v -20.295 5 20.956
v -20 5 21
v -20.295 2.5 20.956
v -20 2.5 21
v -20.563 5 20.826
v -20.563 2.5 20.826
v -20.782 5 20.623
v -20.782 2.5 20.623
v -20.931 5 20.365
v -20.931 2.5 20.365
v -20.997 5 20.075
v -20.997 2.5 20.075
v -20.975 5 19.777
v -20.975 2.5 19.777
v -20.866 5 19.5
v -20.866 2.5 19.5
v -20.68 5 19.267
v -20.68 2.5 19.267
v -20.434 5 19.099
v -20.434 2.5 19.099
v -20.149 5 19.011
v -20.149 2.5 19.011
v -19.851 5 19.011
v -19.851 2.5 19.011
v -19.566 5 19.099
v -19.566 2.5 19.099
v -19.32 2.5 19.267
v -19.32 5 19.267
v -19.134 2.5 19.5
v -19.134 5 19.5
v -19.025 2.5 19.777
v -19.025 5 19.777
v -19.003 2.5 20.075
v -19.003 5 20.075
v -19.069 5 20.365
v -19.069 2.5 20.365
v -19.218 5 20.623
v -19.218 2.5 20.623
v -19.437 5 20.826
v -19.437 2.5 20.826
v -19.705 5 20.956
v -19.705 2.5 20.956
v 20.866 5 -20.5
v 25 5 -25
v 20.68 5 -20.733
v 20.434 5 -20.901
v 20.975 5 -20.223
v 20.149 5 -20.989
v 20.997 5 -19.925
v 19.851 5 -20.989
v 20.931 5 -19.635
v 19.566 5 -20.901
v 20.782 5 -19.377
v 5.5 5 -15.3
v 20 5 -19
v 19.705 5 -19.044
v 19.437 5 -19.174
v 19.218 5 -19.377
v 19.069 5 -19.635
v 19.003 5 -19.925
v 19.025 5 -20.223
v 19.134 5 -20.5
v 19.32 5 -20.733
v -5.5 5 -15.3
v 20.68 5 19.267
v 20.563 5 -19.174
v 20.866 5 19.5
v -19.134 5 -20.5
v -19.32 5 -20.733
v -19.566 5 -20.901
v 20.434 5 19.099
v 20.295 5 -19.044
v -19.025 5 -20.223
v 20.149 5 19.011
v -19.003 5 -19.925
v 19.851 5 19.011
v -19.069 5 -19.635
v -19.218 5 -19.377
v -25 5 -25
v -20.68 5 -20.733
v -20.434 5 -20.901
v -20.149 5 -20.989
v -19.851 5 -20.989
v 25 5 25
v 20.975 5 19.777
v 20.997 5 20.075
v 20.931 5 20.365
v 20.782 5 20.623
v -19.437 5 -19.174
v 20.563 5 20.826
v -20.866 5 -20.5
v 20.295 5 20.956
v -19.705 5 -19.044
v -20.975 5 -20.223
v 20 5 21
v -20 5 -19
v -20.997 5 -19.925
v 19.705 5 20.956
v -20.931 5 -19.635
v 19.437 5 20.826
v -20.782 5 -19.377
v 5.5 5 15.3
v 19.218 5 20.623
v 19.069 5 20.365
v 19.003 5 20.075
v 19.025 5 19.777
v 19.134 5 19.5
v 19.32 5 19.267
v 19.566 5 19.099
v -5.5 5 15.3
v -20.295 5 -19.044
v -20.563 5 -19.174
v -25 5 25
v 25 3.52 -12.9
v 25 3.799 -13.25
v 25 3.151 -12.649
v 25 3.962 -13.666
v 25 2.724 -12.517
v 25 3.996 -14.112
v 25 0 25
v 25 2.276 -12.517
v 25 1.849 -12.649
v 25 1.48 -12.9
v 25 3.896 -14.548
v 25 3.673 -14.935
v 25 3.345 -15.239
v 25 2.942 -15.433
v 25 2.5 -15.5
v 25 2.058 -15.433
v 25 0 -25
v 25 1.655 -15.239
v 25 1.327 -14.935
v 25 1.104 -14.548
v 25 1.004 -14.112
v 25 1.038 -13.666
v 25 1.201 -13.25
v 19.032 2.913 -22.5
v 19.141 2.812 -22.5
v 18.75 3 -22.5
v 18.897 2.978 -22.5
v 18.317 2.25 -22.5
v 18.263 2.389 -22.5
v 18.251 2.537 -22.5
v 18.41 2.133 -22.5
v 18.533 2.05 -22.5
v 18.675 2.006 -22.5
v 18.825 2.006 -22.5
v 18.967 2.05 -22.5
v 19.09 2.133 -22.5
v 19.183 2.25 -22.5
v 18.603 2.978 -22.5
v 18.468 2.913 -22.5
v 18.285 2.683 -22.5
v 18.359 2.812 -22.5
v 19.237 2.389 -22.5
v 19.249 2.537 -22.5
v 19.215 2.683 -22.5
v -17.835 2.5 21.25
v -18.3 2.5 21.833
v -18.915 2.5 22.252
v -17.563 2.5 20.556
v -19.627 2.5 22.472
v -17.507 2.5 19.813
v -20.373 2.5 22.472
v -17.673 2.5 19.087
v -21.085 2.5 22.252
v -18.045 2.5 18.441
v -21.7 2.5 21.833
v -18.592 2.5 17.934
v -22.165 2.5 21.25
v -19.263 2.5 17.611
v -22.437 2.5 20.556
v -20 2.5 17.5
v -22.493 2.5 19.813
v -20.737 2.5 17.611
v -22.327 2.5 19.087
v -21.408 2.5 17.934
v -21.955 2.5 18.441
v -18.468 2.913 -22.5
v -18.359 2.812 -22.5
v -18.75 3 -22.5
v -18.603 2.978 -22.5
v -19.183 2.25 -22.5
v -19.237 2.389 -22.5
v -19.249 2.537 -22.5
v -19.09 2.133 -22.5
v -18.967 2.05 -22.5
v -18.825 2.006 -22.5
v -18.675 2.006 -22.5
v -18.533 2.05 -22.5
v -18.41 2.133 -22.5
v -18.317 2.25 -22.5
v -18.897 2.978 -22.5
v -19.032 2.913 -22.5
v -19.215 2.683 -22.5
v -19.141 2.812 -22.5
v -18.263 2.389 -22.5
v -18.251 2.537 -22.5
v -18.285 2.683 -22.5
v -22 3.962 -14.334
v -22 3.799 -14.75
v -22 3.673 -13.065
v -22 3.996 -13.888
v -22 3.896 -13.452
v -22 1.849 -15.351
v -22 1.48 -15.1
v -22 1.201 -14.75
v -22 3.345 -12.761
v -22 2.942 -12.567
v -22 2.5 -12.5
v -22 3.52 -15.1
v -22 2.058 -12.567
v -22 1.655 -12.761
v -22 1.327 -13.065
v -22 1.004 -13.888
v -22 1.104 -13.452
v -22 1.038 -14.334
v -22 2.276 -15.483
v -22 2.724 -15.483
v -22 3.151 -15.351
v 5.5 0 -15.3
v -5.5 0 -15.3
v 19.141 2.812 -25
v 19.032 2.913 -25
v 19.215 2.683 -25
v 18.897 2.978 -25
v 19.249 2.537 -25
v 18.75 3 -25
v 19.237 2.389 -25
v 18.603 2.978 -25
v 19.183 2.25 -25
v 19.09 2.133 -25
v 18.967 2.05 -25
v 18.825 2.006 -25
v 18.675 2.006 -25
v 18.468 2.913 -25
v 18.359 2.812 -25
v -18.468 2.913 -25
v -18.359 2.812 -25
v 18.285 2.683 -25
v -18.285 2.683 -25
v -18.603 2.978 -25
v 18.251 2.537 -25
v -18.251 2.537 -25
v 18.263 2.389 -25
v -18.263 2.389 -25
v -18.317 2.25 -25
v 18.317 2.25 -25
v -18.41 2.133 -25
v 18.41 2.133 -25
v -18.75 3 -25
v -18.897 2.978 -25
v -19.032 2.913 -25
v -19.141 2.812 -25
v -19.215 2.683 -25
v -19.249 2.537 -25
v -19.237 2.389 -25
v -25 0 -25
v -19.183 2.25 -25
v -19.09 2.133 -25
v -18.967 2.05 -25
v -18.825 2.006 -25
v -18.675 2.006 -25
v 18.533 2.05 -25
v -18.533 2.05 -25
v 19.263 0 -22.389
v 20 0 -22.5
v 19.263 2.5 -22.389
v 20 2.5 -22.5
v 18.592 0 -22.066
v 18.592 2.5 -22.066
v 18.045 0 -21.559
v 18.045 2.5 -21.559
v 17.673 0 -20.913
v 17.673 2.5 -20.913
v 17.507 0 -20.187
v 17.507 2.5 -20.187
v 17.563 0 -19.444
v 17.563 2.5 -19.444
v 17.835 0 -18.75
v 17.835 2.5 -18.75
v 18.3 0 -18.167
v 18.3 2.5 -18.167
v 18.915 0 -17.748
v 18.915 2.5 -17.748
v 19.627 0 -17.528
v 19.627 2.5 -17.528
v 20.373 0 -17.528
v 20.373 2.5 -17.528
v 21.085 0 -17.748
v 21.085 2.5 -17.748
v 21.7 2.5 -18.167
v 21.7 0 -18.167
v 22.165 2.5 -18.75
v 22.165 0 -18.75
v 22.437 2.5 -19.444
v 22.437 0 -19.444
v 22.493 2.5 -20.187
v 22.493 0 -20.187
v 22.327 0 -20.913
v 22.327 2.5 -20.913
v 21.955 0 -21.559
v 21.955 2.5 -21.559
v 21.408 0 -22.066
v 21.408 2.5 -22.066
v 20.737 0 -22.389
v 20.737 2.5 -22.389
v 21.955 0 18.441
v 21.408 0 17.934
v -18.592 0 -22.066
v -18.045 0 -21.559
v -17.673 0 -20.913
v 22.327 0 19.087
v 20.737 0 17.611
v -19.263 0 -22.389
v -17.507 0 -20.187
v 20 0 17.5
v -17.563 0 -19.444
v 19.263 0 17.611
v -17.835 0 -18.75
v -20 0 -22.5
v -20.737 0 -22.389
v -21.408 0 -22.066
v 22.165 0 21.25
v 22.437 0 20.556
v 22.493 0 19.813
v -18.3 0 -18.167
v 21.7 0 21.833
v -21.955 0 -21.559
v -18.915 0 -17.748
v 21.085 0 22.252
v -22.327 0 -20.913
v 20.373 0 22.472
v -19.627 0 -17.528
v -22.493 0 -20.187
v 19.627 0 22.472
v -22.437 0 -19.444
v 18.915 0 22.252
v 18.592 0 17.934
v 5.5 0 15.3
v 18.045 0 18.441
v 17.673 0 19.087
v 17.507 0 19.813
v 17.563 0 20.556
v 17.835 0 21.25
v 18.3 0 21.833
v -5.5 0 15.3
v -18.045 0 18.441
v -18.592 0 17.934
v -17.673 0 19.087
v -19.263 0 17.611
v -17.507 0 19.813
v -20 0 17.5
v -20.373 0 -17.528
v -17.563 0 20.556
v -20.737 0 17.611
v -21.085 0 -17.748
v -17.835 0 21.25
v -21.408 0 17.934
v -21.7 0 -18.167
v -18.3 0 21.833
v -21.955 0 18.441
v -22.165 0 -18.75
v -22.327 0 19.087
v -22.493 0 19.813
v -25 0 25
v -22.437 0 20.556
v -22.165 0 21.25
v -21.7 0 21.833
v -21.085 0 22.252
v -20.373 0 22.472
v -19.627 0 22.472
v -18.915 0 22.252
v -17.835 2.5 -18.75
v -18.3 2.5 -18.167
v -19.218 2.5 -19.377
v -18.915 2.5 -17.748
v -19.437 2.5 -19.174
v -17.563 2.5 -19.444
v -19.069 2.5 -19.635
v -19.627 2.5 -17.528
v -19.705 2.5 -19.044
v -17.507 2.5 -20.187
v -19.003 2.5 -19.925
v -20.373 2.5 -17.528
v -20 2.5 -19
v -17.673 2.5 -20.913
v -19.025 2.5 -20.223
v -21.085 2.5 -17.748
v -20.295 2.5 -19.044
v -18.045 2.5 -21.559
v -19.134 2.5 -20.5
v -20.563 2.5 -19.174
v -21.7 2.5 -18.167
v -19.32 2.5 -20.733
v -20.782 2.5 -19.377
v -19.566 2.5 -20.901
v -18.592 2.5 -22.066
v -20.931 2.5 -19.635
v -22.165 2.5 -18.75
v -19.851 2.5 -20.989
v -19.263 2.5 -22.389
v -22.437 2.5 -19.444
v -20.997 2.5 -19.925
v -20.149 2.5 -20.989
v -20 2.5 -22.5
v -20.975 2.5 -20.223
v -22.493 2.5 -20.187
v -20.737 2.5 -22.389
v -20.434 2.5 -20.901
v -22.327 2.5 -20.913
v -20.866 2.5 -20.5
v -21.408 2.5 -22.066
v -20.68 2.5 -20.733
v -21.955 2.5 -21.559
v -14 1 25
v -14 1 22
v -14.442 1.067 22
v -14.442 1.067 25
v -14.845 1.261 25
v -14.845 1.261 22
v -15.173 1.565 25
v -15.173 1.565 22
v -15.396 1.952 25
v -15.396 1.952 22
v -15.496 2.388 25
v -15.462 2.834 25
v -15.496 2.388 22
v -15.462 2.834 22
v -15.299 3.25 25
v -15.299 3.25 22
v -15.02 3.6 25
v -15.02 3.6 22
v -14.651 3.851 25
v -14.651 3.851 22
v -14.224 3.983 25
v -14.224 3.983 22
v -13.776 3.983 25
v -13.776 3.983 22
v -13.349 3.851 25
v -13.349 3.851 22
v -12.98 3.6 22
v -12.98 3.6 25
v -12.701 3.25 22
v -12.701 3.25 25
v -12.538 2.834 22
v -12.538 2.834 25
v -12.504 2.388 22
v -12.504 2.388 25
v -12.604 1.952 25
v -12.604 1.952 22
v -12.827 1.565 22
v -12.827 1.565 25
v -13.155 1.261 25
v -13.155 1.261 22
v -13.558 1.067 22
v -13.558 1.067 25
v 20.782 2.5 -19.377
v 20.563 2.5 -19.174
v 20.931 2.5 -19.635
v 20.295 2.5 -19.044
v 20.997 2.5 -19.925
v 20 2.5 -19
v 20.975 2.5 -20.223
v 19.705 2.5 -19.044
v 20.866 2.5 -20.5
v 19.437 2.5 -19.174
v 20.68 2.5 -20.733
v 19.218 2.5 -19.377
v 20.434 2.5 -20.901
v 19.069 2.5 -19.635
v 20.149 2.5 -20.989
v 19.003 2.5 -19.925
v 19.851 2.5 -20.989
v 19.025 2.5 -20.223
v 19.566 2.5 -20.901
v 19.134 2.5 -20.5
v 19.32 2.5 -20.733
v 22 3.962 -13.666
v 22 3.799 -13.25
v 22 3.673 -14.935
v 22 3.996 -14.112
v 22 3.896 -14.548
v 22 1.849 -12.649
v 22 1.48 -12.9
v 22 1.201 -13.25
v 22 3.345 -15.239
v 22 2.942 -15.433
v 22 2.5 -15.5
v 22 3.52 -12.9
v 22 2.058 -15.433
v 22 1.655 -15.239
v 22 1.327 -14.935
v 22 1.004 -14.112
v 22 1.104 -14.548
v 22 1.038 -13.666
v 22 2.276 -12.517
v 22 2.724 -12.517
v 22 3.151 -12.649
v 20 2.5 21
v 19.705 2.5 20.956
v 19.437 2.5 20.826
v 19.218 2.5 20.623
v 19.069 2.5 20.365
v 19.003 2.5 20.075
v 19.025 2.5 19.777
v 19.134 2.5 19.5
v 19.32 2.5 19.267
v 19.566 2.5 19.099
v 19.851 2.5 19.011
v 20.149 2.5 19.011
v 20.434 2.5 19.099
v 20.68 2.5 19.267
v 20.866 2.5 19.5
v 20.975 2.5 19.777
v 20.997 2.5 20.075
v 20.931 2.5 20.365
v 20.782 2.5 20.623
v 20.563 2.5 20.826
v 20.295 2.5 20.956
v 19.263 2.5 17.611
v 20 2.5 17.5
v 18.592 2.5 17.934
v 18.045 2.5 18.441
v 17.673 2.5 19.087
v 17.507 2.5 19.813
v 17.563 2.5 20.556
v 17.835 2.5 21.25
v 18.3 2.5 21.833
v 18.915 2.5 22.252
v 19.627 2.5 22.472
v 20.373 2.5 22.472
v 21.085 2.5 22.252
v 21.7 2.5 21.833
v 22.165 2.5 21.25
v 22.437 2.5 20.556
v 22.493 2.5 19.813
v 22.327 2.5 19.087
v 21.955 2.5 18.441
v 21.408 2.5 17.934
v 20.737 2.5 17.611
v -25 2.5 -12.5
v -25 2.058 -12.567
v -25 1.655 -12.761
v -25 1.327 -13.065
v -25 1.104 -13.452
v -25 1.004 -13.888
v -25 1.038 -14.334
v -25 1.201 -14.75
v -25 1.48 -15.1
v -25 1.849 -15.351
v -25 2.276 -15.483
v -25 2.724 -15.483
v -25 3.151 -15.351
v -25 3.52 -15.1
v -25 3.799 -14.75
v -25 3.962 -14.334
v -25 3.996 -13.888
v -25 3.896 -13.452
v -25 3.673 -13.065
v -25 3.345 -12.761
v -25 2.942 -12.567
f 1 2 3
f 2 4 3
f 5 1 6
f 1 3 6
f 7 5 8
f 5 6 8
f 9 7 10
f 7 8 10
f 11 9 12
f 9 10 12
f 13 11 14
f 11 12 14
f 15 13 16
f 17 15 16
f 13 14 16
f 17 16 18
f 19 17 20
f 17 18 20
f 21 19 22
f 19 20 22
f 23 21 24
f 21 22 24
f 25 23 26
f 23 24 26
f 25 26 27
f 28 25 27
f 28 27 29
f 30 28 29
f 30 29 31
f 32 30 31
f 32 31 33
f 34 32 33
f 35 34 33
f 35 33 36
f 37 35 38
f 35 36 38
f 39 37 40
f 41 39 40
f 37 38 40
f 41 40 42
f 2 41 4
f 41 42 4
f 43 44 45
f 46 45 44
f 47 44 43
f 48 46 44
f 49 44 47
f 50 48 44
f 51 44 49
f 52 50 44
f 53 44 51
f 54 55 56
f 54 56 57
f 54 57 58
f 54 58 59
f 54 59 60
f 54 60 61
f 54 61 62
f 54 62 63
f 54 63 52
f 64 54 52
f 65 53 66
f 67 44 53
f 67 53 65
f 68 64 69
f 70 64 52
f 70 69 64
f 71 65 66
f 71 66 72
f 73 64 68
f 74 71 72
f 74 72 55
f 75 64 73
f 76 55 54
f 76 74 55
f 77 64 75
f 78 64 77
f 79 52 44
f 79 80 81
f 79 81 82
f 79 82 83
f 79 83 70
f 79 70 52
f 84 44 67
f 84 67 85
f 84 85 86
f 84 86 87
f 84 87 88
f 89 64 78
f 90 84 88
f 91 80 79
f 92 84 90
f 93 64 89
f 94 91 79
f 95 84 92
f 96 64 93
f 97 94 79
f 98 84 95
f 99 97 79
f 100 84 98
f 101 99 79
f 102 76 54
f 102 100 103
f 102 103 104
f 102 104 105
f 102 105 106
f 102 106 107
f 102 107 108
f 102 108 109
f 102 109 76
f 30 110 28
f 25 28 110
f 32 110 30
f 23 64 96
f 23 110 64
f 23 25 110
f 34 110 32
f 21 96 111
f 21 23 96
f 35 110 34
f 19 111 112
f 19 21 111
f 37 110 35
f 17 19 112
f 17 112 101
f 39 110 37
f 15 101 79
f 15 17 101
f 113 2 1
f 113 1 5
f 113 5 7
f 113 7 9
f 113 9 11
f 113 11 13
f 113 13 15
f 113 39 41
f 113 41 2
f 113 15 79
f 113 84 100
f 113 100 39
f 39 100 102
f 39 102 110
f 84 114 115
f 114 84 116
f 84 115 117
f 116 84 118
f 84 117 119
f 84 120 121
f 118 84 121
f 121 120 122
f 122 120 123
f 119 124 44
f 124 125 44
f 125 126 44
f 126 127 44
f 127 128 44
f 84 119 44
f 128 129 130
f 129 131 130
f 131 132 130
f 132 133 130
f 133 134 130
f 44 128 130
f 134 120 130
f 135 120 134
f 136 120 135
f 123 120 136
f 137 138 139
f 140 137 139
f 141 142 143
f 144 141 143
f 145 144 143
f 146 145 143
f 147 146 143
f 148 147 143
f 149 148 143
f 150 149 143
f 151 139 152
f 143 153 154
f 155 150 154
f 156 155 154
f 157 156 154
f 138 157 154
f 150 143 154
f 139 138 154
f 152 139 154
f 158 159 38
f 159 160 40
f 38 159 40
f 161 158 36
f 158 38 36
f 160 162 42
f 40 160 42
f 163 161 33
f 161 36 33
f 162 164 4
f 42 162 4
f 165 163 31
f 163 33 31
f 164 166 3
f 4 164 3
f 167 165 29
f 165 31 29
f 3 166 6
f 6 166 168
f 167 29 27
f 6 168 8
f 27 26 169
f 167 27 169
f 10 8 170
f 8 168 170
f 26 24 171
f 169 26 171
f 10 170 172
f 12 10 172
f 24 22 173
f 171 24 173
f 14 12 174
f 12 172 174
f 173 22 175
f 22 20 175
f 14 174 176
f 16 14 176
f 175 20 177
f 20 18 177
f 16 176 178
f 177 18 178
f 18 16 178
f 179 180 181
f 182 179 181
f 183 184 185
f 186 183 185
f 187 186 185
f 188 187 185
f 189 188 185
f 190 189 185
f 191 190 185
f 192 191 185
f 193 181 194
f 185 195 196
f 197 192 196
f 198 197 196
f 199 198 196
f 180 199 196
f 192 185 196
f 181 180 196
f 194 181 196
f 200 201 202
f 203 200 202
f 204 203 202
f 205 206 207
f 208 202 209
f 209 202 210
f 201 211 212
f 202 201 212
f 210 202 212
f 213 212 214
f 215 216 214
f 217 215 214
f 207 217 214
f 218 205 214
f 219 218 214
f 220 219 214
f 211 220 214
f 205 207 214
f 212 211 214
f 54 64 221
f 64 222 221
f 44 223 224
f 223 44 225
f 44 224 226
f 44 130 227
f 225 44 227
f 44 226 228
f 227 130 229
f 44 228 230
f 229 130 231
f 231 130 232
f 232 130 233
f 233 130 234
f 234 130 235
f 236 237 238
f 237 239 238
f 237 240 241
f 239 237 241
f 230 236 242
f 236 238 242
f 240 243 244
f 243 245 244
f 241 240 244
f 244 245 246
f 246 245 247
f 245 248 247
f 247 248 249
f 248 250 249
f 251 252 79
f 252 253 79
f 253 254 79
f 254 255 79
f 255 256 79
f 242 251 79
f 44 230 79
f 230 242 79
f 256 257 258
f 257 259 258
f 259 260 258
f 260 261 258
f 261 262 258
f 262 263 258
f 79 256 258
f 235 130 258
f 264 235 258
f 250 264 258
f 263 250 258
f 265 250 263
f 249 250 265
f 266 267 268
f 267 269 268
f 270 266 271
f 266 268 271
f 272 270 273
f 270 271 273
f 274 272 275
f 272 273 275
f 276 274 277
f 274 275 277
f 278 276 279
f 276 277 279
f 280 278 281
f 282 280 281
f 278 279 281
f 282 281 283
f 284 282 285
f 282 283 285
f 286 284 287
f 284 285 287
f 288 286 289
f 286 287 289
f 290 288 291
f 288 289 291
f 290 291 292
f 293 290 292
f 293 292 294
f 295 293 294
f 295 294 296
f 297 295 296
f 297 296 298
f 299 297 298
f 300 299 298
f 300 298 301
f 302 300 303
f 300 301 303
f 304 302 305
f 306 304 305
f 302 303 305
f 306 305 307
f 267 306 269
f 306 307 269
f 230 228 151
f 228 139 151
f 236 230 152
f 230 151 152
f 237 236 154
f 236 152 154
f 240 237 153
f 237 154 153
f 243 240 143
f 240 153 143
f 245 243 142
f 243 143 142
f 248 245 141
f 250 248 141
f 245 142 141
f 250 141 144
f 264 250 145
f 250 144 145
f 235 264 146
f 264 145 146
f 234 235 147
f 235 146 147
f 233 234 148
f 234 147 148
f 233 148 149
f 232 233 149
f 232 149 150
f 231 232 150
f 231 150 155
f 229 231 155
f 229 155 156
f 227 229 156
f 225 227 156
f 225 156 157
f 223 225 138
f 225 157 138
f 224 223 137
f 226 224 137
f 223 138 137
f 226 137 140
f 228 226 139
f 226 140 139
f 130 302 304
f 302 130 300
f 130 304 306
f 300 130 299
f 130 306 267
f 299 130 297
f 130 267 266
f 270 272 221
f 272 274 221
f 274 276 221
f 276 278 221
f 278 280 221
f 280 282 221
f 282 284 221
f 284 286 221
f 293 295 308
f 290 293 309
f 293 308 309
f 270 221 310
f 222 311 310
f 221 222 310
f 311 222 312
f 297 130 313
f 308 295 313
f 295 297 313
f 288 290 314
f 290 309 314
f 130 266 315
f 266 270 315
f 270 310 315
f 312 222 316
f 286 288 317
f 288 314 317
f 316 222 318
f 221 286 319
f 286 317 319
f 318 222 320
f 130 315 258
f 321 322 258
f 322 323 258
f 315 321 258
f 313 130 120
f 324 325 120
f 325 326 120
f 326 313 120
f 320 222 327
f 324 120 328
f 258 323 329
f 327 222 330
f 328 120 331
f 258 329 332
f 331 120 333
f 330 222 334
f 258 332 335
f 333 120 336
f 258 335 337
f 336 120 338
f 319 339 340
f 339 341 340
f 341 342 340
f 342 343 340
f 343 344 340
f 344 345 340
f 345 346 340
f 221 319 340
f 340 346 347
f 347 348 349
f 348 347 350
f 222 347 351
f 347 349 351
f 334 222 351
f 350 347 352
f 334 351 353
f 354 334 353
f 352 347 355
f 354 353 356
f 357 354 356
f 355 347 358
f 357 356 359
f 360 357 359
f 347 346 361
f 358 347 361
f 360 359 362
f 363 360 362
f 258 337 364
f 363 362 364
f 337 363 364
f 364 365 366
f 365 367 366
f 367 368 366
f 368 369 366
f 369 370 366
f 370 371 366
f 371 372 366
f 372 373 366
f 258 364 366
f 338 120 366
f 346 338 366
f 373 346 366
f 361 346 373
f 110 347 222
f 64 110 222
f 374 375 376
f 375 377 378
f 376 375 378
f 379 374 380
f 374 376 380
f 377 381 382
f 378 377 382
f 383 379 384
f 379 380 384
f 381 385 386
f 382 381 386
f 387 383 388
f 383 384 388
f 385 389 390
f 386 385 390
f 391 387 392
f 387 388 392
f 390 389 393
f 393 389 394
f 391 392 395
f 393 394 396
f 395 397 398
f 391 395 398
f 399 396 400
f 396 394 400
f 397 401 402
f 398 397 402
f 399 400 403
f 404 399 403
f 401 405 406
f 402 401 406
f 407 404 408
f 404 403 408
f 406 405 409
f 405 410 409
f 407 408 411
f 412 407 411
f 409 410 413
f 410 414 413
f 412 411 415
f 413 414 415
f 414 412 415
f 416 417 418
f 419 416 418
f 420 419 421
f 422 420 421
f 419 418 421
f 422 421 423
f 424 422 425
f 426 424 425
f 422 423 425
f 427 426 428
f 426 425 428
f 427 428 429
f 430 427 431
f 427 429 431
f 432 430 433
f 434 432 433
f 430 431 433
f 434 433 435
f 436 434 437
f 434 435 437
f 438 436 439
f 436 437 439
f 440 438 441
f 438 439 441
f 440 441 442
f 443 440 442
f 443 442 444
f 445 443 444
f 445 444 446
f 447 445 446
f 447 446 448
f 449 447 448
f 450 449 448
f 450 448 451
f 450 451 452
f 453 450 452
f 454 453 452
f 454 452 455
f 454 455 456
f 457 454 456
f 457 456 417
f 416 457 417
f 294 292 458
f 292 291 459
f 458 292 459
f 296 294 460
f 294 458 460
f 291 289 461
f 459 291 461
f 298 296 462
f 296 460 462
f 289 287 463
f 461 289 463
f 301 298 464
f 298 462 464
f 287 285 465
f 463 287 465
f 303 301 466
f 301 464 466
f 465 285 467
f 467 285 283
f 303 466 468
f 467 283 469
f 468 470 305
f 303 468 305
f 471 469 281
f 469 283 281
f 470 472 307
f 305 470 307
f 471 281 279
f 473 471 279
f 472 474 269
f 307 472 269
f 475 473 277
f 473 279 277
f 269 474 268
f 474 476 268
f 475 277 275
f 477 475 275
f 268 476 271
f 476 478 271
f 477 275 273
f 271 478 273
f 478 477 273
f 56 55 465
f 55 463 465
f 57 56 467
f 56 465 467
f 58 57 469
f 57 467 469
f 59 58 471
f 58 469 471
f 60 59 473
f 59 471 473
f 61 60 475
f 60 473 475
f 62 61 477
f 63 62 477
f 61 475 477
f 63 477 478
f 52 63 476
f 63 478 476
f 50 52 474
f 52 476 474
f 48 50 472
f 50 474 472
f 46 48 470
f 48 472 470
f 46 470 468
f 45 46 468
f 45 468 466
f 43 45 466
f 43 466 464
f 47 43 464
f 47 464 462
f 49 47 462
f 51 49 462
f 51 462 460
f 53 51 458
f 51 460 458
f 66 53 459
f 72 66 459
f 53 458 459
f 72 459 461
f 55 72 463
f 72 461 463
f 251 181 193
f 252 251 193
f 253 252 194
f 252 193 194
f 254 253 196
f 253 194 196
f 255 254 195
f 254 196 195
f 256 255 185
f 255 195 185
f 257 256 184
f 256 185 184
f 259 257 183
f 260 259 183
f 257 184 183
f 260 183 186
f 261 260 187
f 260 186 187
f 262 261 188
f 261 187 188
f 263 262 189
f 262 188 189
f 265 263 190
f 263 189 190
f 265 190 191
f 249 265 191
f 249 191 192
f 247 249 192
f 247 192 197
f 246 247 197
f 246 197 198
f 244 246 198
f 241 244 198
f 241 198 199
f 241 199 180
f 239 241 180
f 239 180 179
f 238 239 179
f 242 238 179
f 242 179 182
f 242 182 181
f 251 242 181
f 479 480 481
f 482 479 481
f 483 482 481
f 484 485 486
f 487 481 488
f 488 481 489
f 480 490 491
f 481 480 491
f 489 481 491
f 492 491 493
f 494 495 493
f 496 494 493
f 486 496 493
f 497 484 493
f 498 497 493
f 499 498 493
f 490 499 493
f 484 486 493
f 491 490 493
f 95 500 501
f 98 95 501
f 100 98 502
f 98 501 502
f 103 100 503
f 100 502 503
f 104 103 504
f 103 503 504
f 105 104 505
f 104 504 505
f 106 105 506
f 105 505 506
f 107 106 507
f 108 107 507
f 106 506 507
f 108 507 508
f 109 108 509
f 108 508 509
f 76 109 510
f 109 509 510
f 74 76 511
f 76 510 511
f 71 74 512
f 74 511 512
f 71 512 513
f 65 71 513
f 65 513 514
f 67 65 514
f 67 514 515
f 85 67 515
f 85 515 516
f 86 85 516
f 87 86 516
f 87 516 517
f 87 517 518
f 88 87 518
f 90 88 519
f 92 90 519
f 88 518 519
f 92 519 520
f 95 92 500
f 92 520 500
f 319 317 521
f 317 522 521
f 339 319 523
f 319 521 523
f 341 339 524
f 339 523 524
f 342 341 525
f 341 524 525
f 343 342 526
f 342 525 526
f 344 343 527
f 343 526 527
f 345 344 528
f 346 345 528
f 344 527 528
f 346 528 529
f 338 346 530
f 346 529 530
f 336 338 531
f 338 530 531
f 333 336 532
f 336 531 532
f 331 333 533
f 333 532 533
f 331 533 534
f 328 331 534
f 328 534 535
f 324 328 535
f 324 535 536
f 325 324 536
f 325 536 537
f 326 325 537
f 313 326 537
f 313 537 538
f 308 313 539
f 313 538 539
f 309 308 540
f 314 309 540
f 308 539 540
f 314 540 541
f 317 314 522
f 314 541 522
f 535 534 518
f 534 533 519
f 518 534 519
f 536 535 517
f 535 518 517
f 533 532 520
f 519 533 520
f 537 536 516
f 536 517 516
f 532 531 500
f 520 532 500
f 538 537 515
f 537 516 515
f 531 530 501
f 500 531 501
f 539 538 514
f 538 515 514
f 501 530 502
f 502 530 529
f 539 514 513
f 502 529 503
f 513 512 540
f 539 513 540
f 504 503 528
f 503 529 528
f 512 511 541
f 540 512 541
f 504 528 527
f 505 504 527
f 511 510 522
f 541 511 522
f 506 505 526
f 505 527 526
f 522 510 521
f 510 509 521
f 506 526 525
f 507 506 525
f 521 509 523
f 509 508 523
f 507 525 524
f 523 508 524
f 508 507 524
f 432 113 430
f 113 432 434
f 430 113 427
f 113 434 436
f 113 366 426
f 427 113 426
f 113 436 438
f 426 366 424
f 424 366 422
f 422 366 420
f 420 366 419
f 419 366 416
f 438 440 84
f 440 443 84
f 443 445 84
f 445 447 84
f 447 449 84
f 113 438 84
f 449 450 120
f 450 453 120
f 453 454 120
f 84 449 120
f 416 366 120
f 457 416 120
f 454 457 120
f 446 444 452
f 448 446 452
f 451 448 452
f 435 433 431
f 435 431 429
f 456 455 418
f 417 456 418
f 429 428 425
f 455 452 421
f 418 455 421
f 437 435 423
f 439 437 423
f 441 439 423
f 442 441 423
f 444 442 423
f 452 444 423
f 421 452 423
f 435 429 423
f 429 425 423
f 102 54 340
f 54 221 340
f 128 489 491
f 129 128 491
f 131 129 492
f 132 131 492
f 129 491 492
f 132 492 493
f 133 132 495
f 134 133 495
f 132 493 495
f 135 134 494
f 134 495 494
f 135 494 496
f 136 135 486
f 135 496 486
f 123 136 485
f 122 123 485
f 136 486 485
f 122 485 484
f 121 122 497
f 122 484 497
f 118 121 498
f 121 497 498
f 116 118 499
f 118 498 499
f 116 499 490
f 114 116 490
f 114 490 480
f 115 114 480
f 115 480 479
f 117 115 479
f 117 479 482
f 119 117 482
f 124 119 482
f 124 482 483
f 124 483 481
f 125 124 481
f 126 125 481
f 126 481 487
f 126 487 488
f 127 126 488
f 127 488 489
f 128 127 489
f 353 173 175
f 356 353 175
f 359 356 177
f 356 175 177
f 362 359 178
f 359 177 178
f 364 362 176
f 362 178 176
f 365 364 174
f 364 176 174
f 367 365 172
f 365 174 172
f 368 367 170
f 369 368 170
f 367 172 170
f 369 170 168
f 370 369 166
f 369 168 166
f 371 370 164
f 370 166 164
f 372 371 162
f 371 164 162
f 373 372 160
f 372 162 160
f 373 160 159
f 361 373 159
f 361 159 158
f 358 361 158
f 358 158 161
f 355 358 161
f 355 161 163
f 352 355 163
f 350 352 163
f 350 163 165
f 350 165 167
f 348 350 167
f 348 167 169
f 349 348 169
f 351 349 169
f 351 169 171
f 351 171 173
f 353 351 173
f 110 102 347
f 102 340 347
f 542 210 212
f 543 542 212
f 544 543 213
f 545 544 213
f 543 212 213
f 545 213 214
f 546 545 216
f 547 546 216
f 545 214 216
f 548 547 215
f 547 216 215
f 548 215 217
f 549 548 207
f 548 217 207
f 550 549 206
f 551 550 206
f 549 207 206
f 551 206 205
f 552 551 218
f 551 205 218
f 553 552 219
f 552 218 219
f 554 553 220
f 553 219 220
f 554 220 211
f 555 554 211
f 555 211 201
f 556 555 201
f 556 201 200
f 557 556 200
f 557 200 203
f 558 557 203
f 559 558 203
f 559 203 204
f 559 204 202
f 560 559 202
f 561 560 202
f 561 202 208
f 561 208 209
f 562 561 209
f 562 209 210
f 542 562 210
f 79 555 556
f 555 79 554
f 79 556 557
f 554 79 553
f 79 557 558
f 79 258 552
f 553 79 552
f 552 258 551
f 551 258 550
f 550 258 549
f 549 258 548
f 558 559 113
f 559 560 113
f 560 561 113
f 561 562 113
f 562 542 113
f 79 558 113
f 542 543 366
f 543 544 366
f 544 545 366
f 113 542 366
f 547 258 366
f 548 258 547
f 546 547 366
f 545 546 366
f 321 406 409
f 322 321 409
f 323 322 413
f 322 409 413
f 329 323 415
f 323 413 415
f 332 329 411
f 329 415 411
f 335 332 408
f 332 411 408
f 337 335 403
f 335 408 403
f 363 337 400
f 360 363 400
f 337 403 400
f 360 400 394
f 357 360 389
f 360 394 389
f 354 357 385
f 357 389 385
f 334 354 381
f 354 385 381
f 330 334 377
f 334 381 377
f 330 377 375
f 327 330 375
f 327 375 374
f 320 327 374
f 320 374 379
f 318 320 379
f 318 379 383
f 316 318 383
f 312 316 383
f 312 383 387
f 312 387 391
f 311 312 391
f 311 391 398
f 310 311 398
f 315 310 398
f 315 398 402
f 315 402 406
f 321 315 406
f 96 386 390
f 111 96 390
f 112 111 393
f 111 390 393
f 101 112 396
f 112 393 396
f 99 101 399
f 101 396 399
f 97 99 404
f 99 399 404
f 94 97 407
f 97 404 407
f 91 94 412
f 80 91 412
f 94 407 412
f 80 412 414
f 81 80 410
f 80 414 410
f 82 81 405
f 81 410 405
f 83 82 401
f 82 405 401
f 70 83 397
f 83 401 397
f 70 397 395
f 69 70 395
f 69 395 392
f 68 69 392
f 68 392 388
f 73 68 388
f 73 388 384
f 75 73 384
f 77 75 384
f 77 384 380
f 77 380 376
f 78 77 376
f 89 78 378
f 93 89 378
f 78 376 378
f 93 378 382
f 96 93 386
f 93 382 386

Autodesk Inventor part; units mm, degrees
ref_plane "YZ Plane" through (0, 0, 0) normal (1, 0, 0) x (0, 1, 0)
ref_plane "XZ Plane" through (0, 0, 0) normal (0, 1, 0) x (-1, 0, 0)
ref_plane "XY Plane" through (0, 0, 0) normal (0, 0, 1) x (1, 0, 0)
sketch "Szkic1" plane through (0, 0, 0) normal (0, 1, 0) x (-1, 0, 0)
  line L0 (25, 25) -> (-25, 25)
  line L1 (-25, 25) -> (-25, -25)
  line L2 (-25, -25) -> (25, -25)
  line L3 (25, -25) -> (25, 25)
  line L4 (0, 25) -> (0, -25)
  line L5 (25, 0) -> (-25, 0)
  circle A0 centre (20, -20) radius 2.5
  circle A1 centre (20, 20) radius 2.5
  circle A2 centre (-20, -20) radius 2.5
  circle A3 centre (-20, 20) radius 2.5
  line L6 (-5.5, 15.3) -> (5.5, 15.3)
  line L7 (5.5, 15.3) -> (5.5, -15.3)
  line L8 (5.5, -15.3) -> (-5.5, -15.3)
  line L9 (-5.5, -15.3) -> (-5.5, 15.3)
  point P0 (0, 0)
  point P1 (0, 0)
  dimension "d0" = 50
  dimension "d1" = 50
  dimension "d2" = 25
  dimension "d3" = 25
  dimension "d4" = 5
  dimension "d5" = 20
  dimension "d6" = 20
  dimension "d69" = 11
  dimension "d70" = 30.6
sketch "Szkic2" plane through (0, 0, 0) normal (0, 1, 0) x (-1, 0, 0)
  point P0 (0, 0)
extrude "Wyciągnięcie proste1" add sketch "Szkic1" along normal blind 5 contours L3 L5 L7 L6 L4 L0 | L4 L6 L9 L5 L1 L0 | L3 L2 L4 L8 L7 L5 | L5 L9 L8 L4 L2 L1 | A0 | A1 | A2 | A3
sketch "Szkic3" plane through (0, 0, 0) normal (0, -1, 0) x (1, 0, 0)
  circle A0 centre (-20, -20) radius 2.5
  line L0 (0, 29.2243) -> (0, -29.2243)
  line L1 (55.447, 0) -> (-42.023, 0)
  circle A1 centre (20, -20) radius 2.5
  circle A2 centre (-20, 20) radius 2.5
  circle A3 centre (20, 20) radius 2.5
  point P0 (0, 0)
  point P1 (0, 0)
  dimension "d9" = 5
  dimension "d10" = 20
  dimension "d11" = 20
hole "Otwór1" at (20, 0, -20) at (-20, 0, -20) at (-20, 0, 20) at (20, 0, 20) direction (0, 1, 0) diameter 5 depth 2.5
sketch "Szkic4" plane through (0, 5, 0) normal (0, 1, 0) x (1, 0, 0)
  line L0 (53.1876, 0) -> (-53.1876, 0)
  line L1 (0, 32.3787) -> (0, -30.0481)
  circle A0 centre (20, -20) radius 2.5 projected
  circle A1 centre (20, -20) radius 2.5
  circle A2 centre (-20, -20) radius 2.5
  circle A3 centre (20, 20) radius 2.5 projected
  circle A4 centre (20, 20) radius 2.5
  circle A5 centre (-20, 20) radius 2.5 projected
  circle A6 centre (-20, 20) radius 2.5
  point P0 (0, 0)
  point P1 (0, 0)
hole "Otwór2" at (-20, 5, -20) at (20, 5, -20) at (20, 5, 20) at (-20, 5, 20) direction (0, -1, 0) diameter 2 depth 2.5
sketch "Szkic5" plane through (25, 0, 25) normal (1, 0, 0) x (0, 0, -1)
  circle A0 centre (39, 2.5) radius 1.5
  line L0 (0, 0) -> (50, 0) projected
  line L1 (50, 0) -> (50, 5) projected
  point P0 (25, 0)
  dimension "d26" = 3
  dimension "d27" = 2.5
  dimension "d28" = 11
sketch "Szkic6" plane through (-25, 0, -25) normal (-1, 0, 0) x (0, 0, 1)
  circle A0 centre (11, 2.5) radius 1.5
  line L0 (0, 0) -> (0, 5) projected
  line L1 (0, 0) -> (50, 0) projected
  point P0 (25, 0)
  dimension "d29" = 3
  dimension "d30" = 11
  dimension "d31" = 2.5
sketch "Szkic7" plane through (-25, 0, 25) normal (0, 0, 1) x (1, 0, 0)
  circle A0 centre (11, 2.5) radius 1.5
  line L0 (0, 0) -> (0, 5) projected
  line L1 (0, 0) -> (50, 0) projected
  point P0 (25, 0)
  dimension "d32" = 3
  dimension "d33" = 11
  dimension "d34" = 2.5
hole "Otwór3" at (-14, 2.5, 25) direction (0, 0, -1) diameter 3 depth 3
hole "Otwór4" at (-25, 2.5, -14) direction (1, 0, 0) diameter 3 depth 3
hole "Otwór5" at (25, 2.5, -14) direction (-1, 0, 0) diameter 3 depth 3
sketch "Szkic8" plane through (25, 0, -25) normal (0, 0, -1) x (-1, 0, 0)
  circle A0 centre (6.25, 2.5) radius 0.5
  line L0 (0, 0) -> (0, 5) projected
  line L1 (0, 0) -> (50, 0) projected
  circle A1 centre (43.75, 2.5) radius 0.5
  line L2 (50, 0) -> (50, 5) projected
  point P0 (25, 0)
  dimension "d56" = 6.25
  dimension "d57" = 1
  dimension "d58" = 2.5
  dimension "d59" = 1
  dimension "d60" = 6.25
  dimension "d61" = 2.5
hole "Otwór6" at (18.75, 2.5, -25) at (-18.75, 2.5, -25) direction (0, 0, 1) diameter 1 depth 2.5
sketch "Szkic9" plane through (25, 0, 25) normal (1, 0, 0) x (0, 0, -1)
  point P0 (25, 0)
properties part number "platforma wriertnicza"
